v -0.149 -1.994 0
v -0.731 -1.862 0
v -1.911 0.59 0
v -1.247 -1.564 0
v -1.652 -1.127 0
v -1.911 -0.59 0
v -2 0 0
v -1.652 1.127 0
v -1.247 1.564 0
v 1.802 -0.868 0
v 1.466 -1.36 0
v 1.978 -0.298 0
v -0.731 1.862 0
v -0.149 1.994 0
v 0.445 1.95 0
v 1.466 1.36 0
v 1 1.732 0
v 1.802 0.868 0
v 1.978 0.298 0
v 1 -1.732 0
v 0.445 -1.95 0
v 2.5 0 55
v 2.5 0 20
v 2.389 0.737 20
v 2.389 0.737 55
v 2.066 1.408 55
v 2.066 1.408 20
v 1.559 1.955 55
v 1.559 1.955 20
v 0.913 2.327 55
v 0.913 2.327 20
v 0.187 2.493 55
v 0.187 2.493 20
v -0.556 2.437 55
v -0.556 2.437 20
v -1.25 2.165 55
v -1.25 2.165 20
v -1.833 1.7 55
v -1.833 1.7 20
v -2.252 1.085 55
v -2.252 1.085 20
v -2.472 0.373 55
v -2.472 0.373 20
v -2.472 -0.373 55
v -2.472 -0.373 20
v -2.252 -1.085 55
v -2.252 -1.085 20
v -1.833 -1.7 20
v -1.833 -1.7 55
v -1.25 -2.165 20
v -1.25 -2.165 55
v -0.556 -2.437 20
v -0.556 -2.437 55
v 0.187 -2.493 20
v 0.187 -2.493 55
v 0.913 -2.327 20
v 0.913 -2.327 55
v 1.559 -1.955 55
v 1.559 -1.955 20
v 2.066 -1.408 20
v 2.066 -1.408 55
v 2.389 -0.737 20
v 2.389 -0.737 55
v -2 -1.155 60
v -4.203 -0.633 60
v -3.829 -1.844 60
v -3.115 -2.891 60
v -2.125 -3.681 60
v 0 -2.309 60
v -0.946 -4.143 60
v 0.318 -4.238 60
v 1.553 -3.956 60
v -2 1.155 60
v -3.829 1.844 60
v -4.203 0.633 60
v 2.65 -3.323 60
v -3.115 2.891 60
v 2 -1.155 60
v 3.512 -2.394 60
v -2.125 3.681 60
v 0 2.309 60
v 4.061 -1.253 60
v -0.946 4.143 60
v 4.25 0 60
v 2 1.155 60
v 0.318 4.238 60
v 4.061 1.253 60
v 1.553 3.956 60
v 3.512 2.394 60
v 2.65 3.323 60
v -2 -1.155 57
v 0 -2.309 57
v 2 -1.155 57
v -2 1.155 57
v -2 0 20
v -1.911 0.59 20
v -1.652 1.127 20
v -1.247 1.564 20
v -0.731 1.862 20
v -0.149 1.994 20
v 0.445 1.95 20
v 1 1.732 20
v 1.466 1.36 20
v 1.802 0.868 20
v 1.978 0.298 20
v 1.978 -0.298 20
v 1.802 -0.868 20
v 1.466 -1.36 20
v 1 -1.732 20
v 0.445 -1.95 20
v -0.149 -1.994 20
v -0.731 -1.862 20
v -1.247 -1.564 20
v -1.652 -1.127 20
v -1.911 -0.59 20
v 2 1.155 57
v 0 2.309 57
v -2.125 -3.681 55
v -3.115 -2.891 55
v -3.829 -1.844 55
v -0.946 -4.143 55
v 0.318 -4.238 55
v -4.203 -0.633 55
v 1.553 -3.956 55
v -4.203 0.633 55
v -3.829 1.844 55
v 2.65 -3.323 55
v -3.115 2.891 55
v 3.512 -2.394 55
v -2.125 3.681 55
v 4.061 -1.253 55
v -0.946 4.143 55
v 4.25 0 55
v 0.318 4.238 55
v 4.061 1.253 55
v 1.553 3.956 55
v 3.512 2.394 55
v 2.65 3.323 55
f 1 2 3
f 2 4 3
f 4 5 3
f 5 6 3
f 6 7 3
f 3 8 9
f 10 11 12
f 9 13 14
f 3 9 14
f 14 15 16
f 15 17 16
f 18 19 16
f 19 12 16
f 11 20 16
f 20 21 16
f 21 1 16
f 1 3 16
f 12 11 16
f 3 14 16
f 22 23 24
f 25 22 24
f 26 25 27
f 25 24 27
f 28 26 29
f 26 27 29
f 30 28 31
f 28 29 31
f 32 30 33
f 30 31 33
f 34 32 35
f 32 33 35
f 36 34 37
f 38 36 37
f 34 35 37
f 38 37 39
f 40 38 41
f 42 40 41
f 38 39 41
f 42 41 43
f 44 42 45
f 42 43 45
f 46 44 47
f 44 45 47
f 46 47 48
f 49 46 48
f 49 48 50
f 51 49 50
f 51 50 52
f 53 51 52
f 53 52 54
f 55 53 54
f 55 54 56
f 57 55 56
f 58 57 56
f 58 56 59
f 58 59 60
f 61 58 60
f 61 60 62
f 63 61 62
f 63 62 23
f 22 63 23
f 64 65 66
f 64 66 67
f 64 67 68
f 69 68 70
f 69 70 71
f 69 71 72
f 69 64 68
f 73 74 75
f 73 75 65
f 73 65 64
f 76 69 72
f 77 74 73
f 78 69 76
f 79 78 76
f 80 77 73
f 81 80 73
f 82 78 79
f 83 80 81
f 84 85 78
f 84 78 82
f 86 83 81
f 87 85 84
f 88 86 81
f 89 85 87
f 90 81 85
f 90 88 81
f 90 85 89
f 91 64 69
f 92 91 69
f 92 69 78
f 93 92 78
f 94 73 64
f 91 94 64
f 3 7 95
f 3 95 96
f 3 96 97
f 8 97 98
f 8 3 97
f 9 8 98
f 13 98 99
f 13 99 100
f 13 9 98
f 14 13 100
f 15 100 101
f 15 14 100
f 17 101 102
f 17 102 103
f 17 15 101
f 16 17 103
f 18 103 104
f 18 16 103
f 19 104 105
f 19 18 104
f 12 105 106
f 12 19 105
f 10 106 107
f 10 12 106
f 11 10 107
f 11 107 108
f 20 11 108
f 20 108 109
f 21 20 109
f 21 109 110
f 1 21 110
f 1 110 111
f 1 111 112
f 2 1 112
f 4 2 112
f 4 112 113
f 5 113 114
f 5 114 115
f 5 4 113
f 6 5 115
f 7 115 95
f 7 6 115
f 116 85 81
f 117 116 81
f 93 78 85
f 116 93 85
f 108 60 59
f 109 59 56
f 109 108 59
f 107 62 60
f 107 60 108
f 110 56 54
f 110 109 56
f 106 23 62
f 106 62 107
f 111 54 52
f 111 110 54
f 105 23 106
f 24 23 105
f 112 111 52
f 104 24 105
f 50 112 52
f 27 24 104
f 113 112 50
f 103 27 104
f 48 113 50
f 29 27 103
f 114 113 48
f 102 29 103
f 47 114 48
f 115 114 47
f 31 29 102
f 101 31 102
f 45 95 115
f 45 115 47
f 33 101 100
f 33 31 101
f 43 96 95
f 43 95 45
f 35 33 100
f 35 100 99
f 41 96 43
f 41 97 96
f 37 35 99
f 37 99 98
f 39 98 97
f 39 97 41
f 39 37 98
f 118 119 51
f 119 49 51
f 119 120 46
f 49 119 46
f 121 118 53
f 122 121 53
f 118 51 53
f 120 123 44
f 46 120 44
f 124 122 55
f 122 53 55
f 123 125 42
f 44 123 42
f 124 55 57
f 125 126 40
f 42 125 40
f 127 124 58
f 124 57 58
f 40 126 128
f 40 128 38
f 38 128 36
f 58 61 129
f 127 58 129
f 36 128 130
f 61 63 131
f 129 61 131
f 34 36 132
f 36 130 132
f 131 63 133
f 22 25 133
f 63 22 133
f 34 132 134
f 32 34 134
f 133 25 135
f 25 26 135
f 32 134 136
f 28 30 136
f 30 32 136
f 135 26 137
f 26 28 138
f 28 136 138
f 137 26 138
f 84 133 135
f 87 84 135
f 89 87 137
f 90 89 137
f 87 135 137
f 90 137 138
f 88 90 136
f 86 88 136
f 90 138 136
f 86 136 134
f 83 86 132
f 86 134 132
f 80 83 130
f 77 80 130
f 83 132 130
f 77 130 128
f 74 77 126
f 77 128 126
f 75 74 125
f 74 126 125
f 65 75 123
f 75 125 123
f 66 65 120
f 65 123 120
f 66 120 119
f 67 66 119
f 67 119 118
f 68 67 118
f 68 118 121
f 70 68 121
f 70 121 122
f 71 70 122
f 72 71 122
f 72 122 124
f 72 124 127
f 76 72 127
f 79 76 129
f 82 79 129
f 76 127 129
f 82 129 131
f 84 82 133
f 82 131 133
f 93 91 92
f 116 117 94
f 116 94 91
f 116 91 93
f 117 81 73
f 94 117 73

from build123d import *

# Parameters (mm, degrees)
SKETCH_1_R          = 2.5
EXTRUDE_1_DEPTH     = 55
SKETCH_2_R          = 4.25
EXTRUDE_2_DEPTH     = 5
CUT_EXTRUDE_1_DEPTH = 3
SKETCH_4_R          = 2.5
SKETCH_4_R_2        = 2
CUT_EXTRUDE_2_DEPTH = 20


with BuildPart() as part:
    # ｽｹｯﾁ1 → ﾎﾞｽ - 押し出し1 (new body)
    with BuildSketch(Plane.XY):
        Circle(SKETCH_1_R)
    extrude(amount=EXTRUDE_1_DEPTH)

    # ｽｹｯﾁ2 → ﾎﾞｽ - 押し出し2 (add)
    with BuildSketch(Plane.XY.offset(55)):
        Circle(SKETCH_2_R)
    extrude(amount=EXTRUDE_2_DEPTH)

    # ｽｹｯﾁ3 → ｶｯﾄ - 押し出し1 (cut)
    with BuildSketch(Plane.XY.offset(60)):
        Polygon((0, 2.309401077), (-2, 1.154700538), (-2, -1.154700538), (0, -2.309401077), (2, -1.154700538), (2, 1.154700538), align=None)
    extrude(amount=-CUT_EXTRUDE_1_DEPTH, mode=Mode.SUBTRACT)

    # ｽｹｯﾁ4 → ｶｯﾄ - 押し出し2 (cut)
    with BuildSketch(Plane(origin=(0, 0, 0), x_dir=(-1, 0, 0), z_dir=(0, 0, -1))):
        Circle(SKETCH_4_R)
        Circle(SKETCH_4_R_2, mode=Mode.SUBTRACT)
    extrude(amount=-CUT_EXTRUDE_2_DEPTH, mode=Mode.SUBTRACT)


solid = part.part
